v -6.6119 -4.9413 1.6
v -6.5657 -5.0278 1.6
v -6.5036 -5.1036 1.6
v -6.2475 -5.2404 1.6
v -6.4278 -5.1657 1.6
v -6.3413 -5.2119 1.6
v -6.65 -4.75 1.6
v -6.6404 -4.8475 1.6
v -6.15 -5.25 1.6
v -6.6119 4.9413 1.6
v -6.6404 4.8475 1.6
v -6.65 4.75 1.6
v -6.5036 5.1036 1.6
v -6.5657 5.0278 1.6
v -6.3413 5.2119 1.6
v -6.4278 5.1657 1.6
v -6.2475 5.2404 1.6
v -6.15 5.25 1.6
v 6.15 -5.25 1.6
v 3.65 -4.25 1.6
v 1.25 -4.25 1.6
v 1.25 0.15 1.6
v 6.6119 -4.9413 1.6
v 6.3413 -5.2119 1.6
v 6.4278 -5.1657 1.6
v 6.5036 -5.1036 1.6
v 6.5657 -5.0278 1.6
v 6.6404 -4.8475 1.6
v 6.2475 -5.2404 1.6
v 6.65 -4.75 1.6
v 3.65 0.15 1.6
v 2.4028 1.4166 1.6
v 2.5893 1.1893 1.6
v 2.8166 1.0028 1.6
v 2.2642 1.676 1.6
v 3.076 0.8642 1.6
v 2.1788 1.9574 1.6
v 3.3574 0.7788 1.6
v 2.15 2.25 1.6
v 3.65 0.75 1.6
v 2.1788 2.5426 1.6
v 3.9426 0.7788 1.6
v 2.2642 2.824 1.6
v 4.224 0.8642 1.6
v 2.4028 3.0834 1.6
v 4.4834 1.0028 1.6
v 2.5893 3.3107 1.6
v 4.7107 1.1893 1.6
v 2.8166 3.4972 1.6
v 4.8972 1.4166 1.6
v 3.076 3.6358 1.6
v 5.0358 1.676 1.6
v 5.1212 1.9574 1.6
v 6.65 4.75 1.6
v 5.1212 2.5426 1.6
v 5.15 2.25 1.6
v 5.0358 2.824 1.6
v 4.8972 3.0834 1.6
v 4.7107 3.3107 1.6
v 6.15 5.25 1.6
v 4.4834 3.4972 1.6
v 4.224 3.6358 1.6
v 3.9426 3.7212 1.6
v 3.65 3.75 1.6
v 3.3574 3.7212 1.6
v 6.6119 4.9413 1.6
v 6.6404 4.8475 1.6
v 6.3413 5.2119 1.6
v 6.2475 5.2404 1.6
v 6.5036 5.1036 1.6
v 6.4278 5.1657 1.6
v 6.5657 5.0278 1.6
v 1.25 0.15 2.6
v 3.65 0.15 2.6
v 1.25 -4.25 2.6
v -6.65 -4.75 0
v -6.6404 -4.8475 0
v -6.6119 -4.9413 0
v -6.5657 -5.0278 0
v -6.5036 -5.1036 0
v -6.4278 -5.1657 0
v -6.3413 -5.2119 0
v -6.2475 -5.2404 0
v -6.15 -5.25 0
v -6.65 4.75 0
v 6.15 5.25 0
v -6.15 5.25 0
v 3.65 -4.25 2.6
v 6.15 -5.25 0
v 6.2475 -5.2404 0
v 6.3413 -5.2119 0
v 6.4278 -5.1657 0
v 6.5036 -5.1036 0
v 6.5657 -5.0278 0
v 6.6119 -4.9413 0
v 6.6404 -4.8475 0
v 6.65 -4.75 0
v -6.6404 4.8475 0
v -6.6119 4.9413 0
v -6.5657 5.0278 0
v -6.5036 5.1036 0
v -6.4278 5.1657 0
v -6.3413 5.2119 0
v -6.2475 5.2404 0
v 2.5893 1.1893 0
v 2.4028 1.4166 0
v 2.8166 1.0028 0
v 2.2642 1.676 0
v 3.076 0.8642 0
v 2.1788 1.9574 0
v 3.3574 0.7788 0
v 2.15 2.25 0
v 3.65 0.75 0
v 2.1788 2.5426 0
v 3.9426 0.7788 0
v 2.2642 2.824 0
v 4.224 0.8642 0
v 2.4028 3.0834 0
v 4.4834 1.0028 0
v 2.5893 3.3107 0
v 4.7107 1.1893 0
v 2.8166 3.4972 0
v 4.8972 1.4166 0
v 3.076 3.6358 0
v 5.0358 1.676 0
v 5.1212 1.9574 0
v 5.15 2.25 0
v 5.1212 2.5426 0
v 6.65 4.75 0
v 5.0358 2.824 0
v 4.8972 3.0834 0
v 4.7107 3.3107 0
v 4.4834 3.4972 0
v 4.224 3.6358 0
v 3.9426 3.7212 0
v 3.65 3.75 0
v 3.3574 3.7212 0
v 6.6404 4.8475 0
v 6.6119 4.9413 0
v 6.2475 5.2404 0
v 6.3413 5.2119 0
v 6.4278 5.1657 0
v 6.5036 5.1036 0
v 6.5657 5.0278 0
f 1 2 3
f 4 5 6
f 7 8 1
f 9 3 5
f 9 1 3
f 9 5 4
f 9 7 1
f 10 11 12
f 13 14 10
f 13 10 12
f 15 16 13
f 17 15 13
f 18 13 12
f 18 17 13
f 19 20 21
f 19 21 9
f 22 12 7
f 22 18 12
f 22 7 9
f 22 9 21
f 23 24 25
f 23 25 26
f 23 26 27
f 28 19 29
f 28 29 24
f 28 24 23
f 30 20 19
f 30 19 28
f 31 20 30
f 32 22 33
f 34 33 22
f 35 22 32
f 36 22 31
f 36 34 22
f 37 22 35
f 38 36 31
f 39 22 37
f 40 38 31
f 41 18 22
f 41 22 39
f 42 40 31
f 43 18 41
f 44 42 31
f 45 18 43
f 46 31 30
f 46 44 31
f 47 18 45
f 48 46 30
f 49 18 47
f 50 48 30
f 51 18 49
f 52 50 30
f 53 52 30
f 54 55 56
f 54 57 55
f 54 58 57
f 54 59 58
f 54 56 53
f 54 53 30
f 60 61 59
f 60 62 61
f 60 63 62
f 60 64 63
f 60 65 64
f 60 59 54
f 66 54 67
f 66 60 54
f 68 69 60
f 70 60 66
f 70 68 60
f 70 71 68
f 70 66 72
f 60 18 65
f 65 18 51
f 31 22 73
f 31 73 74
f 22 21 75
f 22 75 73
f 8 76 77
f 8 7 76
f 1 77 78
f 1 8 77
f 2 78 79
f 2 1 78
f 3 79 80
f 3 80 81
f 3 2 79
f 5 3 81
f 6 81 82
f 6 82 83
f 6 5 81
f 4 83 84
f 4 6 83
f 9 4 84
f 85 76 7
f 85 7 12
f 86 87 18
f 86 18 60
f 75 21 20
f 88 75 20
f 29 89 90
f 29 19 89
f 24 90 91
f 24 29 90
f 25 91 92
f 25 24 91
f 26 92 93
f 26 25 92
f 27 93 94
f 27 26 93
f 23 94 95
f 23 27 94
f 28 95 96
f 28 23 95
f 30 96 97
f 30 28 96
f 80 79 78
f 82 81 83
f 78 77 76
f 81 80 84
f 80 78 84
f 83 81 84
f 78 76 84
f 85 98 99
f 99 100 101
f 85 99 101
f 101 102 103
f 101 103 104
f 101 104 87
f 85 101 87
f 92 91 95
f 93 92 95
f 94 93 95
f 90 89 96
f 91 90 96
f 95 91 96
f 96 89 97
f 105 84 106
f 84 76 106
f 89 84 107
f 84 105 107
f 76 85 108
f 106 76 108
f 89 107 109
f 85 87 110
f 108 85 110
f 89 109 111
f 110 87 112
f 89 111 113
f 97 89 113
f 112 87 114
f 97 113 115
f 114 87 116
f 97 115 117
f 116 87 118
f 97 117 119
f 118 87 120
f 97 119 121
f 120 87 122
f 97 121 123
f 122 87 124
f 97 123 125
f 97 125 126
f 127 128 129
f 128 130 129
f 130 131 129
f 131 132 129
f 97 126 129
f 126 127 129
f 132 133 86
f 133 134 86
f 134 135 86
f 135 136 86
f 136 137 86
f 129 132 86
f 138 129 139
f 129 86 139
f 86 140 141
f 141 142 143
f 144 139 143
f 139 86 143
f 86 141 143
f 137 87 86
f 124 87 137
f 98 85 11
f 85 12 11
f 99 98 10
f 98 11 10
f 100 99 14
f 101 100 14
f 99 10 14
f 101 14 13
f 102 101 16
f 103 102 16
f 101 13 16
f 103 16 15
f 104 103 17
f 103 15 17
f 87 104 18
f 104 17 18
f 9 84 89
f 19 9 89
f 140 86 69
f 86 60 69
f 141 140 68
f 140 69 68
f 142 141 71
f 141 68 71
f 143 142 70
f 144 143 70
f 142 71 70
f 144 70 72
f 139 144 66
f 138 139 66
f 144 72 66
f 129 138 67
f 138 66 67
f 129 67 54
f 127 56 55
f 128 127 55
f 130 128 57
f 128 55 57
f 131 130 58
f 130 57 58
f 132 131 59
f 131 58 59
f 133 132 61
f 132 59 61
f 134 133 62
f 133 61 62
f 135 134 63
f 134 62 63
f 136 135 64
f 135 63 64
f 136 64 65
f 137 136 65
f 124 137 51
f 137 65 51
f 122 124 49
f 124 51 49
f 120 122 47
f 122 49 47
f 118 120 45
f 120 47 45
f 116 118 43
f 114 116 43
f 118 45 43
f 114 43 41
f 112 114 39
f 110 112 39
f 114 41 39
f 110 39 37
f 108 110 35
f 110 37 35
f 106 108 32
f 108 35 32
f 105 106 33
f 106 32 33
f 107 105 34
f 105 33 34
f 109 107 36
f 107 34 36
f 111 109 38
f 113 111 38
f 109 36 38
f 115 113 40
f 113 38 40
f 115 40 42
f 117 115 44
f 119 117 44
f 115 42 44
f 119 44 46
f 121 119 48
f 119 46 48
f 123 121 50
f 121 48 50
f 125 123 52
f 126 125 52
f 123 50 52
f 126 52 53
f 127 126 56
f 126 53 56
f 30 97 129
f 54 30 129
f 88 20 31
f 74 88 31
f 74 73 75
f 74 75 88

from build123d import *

# Parameters (mm, degrees)
SKETCH1_W           = 13.3
SKETCH1_H           = 10.5
BOSS_EXTRUDE1_DEPTH = 1.6
SKETCH2_R           = 1.5
CUT_EXTRUDE1_DEPTH  = 1.6
SKETCH3_W           = 2.4
SKETCH3_H           = 4.4
BOSS_EXTRUDE2_DEPTH = 1
FILLET1_R           = 0.5


with BuildPart() as part:
    # Sketch1 → Boss-Extrude1 (new body)
    with BuildSketch(Plane.XY):
        Rectangle(SKETCH1_W, SKETCH1_H)
    extrude(amount=BOSS_EXTRUDE1_DEPTH)

    # Sketch2 → Cut-Extrude1 (cut)
    with BuildSketch(Plane.XY.offset(1.6)):
        with Locations((3.65, 2.25)):
            Circle(SKETCH2_R)
    extrude(amount=-CUT_EXTRUDE1_DEPTH, mode=Mode.SUBTRACT)

    # Sketch3 → Boss-Extrude2 (add)
    with BuildSketch(Plane.XY.offset(1.6)):
        with Locations((2.45, -2.05)):
            Rectangle(SKETCH3_W, SKETCH3_H)
    extrude(amount=BOSS_EXTRUDE2_DEPTH)

    # Fillet1
    fillet1_edges = [part.edges().sort_by_distance(p)[0] for p in [
        (-6.65, 5.25, 0.8),
        (6.65, 5.25, 0.8),
        (6.65, -5.25, 0.8),
        (-6.65, -5.25, 0.8),
    ]]
    fillet(fillet1_edges, radius=FILLET1_R)


solid = part.part
